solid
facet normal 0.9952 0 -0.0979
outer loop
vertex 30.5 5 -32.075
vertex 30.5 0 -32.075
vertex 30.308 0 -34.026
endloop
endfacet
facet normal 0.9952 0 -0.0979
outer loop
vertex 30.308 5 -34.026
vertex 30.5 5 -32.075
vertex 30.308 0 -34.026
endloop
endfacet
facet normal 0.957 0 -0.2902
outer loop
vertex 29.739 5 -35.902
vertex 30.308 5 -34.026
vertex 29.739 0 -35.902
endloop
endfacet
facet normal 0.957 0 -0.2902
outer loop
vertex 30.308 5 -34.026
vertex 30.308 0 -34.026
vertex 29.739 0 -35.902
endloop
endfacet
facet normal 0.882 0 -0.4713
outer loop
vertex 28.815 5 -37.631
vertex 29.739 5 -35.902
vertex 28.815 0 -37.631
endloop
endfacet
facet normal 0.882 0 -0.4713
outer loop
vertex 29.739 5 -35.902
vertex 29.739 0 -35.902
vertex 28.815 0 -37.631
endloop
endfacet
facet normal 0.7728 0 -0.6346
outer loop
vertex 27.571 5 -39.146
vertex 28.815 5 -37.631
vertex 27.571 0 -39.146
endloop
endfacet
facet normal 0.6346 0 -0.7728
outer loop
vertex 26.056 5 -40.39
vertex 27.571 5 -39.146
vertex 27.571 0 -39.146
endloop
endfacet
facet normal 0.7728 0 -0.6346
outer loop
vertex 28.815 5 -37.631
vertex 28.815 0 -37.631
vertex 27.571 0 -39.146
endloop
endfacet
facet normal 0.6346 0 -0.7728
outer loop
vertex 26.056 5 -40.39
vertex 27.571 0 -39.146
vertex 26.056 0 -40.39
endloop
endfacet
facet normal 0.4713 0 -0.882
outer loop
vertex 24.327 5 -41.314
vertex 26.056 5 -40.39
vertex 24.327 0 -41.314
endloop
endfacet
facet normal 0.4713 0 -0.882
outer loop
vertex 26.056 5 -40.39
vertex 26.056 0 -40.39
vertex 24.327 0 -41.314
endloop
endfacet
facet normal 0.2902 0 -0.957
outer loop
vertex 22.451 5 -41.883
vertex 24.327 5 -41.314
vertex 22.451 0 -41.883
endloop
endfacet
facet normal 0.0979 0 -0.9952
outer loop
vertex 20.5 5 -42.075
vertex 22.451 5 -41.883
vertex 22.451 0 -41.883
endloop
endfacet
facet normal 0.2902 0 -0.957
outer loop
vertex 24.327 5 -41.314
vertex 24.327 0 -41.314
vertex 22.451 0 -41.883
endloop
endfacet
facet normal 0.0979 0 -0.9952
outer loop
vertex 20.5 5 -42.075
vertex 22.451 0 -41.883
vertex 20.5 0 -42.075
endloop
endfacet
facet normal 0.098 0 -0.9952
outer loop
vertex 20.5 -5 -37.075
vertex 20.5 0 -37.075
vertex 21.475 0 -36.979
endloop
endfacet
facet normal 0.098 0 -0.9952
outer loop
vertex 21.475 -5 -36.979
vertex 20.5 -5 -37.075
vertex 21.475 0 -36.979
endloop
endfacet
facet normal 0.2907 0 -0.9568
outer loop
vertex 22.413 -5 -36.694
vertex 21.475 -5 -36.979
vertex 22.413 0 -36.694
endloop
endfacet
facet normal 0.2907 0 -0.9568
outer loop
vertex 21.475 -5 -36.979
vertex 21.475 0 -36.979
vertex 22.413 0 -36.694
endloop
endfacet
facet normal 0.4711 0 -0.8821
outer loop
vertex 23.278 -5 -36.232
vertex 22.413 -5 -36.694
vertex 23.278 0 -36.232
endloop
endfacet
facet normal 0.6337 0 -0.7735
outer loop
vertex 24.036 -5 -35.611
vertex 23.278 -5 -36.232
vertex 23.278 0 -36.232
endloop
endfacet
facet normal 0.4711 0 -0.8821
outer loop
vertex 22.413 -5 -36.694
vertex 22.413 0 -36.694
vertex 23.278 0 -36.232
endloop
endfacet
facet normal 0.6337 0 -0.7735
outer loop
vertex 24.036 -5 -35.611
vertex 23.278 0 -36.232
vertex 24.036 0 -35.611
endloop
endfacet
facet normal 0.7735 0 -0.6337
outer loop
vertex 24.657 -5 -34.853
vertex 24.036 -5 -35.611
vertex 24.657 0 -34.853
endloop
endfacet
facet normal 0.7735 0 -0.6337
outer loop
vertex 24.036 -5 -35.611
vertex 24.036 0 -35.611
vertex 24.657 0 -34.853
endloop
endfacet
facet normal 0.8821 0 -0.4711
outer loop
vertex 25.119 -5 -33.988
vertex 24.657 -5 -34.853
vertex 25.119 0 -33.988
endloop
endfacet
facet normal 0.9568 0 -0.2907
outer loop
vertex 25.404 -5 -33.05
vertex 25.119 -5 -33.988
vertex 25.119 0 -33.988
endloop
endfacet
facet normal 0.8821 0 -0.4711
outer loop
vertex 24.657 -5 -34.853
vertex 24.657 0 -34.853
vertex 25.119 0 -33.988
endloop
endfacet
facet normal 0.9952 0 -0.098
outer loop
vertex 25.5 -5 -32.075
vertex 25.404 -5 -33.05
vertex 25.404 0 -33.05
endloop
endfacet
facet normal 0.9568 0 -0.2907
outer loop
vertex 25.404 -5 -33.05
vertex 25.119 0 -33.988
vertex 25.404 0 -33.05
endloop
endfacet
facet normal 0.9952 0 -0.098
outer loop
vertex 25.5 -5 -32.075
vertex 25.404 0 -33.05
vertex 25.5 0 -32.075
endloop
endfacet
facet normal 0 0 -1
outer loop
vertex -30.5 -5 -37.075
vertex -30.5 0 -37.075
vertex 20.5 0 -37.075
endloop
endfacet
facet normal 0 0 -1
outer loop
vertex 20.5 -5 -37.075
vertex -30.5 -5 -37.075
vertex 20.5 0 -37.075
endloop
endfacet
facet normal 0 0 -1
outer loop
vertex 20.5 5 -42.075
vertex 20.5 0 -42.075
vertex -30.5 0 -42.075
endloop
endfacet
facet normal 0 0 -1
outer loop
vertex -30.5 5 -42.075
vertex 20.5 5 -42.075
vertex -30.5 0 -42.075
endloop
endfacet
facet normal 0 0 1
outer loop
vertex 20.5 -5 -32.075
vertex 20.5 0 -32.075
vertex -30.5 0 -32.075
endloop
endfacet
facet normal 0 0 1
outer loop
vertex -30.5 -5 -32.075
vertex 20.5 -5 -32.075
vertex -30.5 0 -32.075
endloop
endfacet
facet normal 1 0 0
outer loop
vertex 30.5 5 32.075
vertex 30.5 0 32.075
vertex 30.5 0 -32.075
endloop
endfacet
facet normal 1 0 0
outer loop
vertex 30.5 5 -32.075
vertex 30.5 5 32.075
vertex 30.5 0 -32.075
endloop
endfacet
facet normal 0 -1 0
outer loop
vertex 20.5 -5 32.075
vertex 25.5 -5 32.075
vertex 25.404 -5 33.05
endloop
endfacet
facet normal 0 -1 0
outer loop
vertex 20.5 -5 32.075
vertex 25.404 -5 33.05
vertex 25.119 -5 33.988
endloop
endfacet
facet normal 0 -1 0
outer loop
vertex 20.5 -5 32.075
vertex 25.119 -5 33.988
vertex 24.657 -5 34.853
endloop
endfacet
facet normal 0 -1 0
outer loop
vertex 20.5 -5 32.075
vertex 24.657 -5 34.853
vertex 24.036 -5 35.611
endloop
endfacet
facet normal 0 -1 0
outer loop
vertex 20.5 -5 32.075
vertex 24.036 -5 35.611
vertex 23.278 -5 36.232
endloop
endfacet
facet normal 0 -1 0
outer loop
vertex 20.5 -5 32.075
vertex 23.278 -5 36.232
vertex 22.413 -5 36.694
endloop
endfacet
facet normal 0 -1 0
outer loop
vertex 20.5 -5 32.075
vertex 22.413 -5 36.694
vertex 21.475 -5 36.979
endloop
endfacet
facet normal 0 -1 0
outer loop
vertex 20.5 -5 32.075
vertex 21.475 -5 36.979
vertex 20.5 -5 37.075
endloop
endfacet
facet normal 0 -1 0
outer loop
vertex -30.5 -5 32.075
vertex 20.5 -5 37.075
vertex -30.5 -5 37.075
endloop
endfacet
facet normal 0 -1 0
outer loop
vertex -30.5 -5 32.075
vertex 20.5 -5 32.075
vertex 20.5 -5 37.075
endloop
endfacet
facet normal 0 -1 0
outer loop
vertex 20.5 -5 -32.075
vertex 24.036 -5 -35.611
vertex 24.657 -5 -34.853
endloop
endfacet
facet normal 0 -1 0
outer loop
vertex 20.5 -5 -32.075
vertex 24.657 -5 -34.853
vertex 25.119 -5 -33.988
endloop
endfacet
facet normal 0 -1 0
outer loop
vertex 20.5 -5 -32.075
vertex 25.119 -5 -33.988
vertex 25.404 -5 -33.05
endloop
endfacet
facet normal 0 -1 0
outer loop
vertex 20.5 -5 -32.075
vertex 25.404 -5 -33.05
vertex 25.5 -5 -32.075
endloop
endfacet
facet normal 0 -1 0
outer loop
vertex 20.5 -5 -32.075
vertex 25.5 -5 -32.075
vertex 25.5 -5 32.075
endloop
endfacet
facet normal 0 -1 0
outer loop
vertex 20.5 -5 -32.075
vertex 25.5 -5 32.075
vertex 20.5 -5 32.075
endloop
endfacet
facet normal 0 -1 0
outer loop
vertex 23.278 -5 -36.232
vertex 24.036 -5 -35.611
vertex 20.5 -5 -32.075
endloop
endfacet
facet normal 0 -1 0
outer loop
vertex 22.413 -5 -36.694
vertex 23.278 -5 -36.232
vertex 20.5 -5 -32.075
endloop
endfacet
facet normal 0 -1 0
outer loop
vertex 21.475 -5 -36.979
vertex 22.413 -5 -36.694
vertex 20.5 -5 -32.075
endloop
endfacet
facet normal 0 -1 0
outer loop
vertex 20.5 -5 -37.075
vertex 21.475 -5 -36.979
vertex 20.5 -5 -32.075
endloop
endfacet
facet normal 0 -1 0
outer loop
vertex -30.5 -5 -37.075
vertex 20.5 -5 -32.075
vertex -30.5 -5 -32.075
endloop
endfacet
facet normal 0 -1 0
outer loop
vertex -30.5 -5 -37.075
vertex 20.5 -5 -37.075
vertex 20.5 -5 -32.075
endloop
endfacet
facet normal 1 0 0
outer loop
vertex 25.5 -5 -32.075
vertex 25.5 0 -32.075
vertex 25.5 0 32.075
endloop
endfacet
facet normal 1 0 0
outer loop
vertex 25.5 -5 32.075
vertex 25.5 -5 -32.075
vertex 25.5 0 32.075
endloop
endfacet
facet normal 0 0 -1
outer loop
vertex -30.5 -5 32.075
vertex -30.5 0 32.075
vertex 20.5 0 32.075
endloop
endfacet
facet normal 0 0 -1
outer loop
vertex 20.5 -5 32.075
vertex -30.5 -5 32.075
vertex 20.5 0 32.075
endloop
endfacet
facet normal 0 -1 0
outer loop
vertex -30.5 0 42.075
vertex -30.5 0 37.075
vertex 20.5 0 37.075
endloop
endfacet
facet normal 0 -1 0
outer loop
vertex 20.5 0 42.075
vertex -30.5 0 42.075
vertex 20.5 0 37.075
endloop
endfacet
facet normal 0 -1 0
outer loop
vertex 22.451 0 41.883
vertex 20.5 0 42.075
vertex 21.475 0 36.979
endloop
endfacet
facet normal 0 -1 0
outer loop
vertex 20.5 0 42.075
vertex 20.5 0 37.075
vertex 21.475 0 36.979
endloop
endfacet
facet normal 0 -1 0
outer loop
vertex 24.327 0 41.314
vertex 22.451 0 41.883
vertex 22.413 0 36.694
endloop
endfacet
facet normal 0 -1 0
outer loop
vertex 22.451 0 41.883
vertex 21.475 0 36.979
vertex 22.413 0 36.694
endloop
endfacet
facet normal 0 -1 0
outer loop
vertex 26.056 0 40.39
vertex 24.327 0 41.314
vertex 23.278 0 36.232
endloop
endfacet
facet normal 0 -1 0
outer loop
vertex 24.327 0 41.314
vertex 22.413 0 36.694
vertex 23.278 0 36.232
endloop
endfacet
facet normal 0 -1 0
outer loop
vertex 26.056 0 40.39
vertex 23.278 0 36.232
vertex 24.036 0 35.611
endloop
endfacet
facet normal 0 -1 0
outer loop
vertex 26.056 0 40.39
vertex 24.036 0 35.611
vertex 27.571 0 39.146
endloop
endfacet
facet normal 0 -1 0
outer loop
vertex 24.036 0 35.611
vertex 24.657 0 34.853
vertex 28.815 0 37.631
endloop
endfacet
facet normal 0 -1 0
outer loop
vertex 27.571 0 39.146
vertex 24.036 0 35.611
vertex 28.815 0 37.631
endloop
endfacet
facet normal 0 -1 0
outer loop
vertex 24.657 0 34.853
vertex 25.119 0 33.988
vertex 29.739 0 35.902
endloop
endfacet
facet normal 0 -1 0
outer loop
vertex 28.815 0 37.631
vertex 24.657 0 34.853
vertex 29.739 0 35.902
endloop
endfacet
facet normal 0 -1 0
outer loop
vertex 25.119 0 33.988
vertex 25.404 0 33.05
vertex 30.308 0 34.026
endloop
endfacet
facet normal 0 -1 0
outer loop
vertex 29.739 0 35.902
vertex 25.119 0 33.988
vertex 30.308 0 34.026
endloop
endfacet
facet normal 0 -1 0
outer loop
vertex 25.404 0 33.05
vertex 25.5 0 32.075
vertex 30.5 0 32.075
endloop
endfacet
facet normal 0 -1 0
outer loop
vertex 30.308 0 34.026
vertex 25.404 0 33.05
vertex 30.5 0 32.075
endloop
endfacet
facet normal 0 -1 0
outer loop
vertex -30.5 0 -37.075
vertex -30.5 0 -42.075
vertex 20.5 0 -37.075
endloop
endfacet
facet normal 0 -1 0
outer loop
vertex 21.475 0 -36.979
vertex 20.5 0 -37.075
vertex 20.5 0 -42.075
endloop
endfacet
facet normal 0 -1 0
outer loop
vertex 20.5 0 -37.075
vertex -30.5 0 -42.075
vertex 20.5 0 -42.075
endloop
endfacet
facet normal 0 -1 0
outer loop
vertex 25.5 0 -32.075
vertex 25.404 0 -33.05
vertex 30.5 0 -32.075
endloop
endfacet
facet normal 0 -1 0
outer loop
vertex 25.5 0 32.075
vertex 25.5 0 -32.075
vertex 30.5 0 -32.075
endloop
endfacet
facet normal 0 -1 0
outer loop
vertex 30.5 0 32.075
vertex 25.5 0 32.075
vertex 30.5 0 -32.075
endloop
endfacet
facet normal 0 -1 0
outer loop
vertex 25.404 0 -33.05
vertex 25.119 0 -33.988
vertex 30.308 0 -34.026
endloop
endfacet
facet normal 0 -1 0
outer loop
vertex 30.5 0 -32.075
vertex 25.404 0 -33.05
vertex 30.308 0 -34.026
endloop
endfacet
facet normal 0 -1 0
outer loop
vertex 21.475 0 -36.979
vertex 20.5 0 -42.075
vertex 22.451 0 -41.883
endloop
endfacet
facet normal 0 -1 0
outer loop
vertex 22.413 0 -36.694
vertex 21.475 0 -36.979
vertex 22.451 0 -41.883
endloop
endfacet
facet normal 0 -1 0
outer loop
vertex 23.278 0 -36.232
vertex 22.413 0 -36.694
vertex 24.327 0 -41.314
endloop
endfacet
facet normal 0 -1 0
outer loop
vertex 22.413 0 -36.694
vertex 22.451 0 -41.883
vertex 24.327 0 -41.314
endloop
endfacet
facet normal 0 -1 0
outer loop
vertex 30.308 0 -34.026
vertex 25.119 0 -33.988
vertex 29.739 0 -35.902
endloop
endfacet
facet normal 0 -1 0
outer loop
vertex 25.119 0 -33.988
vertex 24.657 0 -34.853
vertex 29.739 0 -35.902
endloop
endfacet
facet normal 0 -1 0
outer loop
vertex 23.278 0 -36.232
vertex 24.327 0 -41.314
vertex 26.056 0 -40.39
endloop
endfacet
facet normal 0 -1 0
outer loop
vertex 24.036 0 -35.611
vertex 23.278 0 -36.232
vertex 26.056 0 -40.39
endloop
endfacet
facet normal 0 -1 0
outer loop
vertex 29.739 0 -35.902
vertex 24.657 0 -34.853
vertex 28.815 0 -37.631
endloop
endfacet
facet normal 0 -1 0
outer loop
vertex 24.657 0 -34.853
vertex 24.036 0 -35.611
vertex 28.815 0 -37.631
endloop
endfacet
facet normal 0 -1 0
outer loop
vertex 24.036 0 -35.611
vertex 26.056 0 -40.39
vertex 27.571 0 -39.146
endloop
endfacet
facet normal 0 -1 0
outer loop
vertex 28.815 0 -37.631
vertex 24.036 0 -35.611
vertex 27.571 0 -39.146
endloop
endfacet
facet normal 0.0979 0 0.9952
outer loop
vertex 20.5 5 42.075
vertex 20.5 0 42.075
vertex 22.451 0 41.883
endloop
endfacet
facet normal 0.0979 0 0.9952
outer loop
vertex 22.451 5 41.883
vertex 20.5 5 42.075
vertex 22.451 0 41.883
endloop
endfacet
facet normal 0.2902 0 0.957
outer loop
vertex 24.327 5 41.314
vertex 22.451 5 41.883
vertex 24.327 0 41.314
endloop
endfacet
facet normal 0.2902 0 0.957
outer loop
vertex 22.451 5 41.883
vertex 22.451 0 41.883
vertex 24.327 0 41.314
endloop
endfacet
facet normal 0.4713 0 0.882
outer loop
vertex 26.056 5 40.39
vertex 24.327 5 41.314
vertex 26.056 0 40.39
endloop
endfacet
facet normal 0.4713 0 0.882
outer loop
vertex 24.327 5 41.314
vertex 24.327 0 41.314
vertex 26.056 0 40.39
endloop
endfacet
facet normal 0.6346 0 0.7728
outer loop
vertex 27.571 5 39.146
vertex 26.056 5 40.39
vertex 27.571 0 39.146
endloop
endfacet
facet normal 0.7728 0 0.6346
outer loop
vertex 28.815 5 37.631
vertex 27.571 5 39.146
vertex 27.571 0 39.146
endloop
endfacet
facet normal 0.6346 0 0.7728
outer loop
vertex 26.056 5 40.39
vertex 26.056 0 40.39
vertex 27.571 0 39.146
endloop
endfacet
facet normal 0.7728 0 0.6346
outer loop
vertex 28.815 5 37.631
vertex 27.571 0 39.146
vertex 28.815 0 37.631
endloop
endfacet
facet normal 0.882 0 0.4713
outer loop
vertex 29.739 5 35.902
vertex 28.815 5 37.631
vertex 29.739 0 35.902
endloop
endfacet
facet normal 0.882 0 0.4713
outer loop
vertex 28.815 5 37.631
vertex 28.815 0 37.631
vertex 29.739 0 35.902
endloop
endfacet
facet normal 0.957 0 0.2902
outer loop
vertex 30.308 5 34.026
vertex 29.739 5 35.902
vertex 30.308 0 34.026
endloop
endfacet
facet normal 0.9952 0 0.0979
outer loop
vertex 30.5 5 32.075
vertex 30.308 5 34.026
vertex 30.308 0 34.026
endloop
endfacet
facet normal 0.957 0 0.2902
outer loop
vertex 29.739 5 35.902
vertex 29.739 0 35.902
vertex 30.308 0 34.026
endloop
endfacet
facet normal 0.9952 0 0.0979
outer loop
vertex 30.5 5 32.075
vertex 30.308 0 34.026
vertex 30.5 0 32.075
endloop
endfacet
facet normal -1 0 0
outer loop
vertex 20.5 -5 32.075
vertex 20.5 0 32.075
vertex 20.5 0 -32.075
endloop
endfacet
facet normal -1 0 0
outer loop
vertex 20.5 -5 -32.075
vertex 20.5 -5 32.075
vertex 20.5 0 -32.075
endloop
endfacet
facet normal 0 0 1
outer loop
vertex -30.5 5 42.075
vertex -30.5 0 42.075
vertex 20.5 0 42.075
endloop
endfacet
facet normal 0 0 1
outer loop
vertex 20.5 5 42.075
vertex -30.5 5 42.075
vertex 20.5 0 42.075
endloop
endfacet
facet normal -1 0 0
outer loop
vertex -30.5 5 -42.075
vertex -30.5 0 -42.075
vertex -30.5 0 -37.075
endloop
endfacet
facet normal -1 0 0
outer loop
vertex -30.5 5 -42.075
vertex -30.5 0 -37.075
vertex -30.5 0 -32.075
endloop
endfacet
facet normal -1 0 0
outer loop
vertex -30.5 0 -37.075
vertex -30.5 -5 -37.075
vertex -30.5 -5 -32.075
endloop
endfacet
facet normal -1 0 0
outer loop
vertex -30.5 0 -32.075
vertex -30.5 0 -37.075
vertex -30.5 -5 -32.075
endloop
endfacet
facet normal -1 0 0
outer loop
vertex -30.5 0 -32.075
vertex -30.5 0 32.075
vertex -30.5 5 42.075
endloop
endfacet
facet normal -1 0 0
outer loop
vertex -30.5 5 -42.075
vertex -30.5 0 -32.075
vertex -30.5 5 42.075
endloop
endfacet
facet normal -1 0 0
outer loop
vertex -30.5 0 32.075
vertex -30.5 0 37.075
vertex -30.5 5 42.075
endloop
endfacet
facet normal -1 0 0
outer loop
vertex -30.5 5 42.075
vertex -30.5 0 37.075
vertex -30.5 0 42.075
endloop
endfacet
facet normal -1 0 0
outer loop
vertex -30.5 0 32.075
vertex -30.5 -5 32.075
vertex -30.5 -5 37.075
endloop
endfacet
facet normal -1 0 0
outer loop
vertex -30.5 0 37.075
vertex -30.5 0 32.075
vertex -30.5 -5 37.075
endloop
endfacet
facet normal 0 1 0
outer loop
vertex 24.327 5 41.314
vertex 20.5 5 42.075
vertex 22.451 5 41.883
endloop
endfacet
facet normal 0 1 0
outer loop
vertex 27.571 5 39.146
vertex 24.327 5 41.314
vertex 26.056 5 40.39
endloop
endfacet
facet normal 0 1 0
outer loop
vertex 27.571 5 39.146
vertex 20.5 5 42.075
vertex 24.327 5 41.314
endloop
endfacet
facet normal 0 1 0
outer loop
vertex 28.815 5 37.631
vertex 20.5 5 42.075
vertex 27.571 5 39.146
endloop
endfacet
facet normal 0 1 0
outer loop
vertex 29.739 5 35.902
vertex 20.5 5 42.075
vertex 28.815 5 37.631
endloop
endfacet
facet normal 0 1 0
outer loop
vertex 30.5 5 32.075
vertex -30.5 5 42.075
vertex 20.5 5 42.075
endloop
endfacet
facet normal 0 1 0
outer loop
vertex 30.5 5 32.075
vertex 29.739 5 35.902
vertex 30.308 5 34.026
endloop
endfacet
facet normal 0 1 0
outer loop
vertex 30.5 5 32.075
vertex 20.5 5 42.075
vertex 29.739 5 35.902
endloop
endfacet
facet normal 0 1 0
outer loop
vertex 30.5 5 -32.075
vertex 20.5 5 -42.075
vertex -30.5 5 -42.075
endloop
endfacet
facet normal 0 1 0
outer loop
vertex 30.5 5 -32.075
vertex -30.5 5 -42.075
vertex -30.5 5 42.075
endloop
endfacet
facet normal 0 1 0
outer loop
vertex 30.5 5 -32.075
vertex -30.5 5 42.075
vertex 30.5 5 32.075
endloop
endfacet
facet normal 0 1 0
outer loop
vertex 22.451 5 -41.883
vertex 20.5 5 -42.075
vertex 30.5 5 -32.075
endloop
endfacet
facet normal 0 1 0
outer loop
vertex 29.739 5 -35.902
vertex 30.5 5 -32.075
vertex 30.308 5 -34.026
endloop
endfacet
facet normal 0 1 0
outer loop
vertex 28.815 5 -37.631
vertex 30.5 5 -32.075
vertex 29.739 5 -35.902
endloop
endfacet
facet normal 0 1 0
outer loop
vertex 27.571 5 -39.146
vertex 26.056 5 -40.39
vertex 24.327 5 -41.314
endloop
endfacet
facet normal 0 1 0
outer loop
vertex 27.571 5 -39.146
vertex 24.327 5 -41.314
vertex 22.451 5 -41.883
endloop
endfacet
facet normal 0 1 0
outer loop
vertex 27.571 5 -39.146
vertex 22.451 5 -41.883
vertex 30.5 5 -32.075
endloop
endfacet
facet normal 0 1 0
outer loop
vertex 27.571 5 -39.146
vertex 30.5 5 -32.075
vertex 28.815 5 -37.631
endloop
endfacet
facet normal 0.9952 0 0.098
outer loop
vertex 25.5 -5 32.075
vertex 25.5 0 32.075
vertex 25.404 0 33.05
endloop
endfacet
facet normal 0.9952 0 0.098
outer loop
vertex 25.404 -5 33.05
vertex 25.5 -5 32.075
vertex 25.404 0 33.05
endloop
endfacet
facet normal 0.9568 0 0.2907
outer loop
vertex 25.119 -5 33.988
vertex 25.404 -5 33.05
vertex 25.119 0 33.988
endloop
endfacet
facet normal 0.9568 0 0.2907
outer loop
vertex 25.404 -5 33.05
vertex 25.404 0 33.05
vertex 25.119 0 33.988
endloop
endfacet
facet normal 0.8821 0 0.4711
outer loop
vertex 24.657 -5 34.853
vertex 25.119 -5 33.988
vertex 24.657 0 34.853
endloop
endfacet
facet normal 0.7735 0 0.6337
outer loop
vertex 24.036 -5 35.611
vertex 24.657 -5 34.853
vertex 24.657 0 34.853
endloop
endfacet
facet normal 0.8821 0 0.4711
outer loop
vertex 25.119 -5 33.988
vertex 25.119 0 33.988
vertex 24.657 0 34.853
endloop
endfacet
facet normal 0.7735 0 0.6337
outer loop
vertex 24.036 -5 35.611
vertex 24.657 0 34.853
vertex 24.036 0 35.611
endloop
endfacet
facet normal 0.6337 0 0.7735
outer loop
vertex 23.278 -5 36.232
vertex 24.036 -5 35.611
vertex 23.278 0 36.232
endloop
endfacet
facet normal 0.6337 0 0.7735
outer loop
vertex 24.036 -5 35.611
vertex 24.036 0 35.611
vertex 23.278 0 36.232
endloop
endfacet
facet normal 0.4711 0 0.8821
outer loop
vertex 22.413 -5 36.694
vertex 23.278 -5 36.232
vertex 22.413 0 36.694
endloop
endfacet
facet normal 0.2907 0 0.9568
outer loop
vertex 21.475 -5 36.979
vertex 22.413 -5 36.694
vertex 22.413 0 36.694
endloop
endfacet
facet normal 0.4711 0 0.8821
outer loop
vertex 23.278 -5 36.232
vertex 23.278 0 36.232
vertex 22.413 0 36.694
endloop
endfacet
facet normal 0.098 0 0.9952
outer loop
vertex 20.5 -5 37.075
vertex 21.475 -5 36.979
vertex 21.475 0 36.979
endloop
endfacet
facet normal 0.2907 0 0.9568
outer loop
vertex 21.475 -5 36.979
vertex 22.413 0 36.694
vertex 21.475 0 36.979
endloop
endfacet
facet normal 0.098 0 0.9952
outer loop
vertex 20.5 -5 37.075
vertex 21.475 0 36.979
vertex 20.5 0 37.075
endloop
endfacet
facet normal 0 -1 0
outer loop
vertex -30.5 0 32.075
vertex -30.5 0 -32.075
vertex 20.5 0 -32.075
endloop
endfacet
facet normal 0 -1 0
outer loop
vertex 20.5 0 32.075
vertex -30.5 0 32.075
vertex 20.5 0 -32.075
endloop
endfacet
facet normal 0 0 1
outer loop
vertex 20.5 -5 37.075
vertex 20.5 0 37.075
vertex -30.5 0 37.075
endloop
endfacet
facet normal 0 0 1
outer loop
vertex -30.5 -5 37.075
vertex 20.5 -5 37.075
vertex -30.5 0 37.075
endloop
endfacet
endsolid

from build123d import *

# Parameters (mm, degrees)
SALIENTE_EXTRUIR1_DEPTH = 5
SALIENTE_EXTRUIR2_DEPTH = 5


with BuildPart() as part:
    # Croquis1 → Saliente-Extruir1 (new body)
    with BuildSketch(Plane(origin=(0, 0, 0), x_dir=(1, 0, 0), z_dir=(0, 1, 0))):
        with BuildLine():
            Line((-30.5, -42.075), (20.5, -42.075))
            ThreePointArc((20.5, -42.075), (27.571067812, -39.146067812), (30.5, -32.075))
            Line((30.5, -32.075), (30.5, 32.075))
            ThreePointArc((30.5, 32.075), (27.571067812, 39.146067812), (20.5, 42.075))
            Line((20.5, 42.075), (-30.5, 42.075))
            Line((-30.5, 42.075), (-30.5, -42.075))
        make_face()
    extrude(amount=SALIENTE_EXTRUIR1_DEPTH)

    # Croquis2 → Saliente-Extruir2 (add)
    with BuildSketch(Plane(origin=(0, 0, 0), x_dir=(1, 0, 0), z_dir=(0, 1, 0))):
        with BuildLine():
            Line((-30.5, -32.075), (20.5, -32.075))
            Line((20.5, -32.075), (20.5, 32.075))
            Line((20.5, 32.075), (-30.5, 32.075))
            Line((-30.5, 32.075), (-30.5, 37.075))
            Line((-30.5, 37.075), (20.5, 37.075))
            ThreePointArc((20.5, 37.075), (24.035533906, 35.610533906), (25.5, 32.075))
            Line((25.5, 32.075), (25.5, -32.075))
            ThreePointArc((25.5, -32.075), (24.035533906, -35.610533906), (20.5, -37.075))
            Line((20.5, -37.075), (-30.5, -37.075))
            Line((-30.5, -37.075), (-30.5, -32.075))
        make_face()
    extrude(amount=-SALIENTE_EXTRUIR2_DEPTH)


solid = part.part
